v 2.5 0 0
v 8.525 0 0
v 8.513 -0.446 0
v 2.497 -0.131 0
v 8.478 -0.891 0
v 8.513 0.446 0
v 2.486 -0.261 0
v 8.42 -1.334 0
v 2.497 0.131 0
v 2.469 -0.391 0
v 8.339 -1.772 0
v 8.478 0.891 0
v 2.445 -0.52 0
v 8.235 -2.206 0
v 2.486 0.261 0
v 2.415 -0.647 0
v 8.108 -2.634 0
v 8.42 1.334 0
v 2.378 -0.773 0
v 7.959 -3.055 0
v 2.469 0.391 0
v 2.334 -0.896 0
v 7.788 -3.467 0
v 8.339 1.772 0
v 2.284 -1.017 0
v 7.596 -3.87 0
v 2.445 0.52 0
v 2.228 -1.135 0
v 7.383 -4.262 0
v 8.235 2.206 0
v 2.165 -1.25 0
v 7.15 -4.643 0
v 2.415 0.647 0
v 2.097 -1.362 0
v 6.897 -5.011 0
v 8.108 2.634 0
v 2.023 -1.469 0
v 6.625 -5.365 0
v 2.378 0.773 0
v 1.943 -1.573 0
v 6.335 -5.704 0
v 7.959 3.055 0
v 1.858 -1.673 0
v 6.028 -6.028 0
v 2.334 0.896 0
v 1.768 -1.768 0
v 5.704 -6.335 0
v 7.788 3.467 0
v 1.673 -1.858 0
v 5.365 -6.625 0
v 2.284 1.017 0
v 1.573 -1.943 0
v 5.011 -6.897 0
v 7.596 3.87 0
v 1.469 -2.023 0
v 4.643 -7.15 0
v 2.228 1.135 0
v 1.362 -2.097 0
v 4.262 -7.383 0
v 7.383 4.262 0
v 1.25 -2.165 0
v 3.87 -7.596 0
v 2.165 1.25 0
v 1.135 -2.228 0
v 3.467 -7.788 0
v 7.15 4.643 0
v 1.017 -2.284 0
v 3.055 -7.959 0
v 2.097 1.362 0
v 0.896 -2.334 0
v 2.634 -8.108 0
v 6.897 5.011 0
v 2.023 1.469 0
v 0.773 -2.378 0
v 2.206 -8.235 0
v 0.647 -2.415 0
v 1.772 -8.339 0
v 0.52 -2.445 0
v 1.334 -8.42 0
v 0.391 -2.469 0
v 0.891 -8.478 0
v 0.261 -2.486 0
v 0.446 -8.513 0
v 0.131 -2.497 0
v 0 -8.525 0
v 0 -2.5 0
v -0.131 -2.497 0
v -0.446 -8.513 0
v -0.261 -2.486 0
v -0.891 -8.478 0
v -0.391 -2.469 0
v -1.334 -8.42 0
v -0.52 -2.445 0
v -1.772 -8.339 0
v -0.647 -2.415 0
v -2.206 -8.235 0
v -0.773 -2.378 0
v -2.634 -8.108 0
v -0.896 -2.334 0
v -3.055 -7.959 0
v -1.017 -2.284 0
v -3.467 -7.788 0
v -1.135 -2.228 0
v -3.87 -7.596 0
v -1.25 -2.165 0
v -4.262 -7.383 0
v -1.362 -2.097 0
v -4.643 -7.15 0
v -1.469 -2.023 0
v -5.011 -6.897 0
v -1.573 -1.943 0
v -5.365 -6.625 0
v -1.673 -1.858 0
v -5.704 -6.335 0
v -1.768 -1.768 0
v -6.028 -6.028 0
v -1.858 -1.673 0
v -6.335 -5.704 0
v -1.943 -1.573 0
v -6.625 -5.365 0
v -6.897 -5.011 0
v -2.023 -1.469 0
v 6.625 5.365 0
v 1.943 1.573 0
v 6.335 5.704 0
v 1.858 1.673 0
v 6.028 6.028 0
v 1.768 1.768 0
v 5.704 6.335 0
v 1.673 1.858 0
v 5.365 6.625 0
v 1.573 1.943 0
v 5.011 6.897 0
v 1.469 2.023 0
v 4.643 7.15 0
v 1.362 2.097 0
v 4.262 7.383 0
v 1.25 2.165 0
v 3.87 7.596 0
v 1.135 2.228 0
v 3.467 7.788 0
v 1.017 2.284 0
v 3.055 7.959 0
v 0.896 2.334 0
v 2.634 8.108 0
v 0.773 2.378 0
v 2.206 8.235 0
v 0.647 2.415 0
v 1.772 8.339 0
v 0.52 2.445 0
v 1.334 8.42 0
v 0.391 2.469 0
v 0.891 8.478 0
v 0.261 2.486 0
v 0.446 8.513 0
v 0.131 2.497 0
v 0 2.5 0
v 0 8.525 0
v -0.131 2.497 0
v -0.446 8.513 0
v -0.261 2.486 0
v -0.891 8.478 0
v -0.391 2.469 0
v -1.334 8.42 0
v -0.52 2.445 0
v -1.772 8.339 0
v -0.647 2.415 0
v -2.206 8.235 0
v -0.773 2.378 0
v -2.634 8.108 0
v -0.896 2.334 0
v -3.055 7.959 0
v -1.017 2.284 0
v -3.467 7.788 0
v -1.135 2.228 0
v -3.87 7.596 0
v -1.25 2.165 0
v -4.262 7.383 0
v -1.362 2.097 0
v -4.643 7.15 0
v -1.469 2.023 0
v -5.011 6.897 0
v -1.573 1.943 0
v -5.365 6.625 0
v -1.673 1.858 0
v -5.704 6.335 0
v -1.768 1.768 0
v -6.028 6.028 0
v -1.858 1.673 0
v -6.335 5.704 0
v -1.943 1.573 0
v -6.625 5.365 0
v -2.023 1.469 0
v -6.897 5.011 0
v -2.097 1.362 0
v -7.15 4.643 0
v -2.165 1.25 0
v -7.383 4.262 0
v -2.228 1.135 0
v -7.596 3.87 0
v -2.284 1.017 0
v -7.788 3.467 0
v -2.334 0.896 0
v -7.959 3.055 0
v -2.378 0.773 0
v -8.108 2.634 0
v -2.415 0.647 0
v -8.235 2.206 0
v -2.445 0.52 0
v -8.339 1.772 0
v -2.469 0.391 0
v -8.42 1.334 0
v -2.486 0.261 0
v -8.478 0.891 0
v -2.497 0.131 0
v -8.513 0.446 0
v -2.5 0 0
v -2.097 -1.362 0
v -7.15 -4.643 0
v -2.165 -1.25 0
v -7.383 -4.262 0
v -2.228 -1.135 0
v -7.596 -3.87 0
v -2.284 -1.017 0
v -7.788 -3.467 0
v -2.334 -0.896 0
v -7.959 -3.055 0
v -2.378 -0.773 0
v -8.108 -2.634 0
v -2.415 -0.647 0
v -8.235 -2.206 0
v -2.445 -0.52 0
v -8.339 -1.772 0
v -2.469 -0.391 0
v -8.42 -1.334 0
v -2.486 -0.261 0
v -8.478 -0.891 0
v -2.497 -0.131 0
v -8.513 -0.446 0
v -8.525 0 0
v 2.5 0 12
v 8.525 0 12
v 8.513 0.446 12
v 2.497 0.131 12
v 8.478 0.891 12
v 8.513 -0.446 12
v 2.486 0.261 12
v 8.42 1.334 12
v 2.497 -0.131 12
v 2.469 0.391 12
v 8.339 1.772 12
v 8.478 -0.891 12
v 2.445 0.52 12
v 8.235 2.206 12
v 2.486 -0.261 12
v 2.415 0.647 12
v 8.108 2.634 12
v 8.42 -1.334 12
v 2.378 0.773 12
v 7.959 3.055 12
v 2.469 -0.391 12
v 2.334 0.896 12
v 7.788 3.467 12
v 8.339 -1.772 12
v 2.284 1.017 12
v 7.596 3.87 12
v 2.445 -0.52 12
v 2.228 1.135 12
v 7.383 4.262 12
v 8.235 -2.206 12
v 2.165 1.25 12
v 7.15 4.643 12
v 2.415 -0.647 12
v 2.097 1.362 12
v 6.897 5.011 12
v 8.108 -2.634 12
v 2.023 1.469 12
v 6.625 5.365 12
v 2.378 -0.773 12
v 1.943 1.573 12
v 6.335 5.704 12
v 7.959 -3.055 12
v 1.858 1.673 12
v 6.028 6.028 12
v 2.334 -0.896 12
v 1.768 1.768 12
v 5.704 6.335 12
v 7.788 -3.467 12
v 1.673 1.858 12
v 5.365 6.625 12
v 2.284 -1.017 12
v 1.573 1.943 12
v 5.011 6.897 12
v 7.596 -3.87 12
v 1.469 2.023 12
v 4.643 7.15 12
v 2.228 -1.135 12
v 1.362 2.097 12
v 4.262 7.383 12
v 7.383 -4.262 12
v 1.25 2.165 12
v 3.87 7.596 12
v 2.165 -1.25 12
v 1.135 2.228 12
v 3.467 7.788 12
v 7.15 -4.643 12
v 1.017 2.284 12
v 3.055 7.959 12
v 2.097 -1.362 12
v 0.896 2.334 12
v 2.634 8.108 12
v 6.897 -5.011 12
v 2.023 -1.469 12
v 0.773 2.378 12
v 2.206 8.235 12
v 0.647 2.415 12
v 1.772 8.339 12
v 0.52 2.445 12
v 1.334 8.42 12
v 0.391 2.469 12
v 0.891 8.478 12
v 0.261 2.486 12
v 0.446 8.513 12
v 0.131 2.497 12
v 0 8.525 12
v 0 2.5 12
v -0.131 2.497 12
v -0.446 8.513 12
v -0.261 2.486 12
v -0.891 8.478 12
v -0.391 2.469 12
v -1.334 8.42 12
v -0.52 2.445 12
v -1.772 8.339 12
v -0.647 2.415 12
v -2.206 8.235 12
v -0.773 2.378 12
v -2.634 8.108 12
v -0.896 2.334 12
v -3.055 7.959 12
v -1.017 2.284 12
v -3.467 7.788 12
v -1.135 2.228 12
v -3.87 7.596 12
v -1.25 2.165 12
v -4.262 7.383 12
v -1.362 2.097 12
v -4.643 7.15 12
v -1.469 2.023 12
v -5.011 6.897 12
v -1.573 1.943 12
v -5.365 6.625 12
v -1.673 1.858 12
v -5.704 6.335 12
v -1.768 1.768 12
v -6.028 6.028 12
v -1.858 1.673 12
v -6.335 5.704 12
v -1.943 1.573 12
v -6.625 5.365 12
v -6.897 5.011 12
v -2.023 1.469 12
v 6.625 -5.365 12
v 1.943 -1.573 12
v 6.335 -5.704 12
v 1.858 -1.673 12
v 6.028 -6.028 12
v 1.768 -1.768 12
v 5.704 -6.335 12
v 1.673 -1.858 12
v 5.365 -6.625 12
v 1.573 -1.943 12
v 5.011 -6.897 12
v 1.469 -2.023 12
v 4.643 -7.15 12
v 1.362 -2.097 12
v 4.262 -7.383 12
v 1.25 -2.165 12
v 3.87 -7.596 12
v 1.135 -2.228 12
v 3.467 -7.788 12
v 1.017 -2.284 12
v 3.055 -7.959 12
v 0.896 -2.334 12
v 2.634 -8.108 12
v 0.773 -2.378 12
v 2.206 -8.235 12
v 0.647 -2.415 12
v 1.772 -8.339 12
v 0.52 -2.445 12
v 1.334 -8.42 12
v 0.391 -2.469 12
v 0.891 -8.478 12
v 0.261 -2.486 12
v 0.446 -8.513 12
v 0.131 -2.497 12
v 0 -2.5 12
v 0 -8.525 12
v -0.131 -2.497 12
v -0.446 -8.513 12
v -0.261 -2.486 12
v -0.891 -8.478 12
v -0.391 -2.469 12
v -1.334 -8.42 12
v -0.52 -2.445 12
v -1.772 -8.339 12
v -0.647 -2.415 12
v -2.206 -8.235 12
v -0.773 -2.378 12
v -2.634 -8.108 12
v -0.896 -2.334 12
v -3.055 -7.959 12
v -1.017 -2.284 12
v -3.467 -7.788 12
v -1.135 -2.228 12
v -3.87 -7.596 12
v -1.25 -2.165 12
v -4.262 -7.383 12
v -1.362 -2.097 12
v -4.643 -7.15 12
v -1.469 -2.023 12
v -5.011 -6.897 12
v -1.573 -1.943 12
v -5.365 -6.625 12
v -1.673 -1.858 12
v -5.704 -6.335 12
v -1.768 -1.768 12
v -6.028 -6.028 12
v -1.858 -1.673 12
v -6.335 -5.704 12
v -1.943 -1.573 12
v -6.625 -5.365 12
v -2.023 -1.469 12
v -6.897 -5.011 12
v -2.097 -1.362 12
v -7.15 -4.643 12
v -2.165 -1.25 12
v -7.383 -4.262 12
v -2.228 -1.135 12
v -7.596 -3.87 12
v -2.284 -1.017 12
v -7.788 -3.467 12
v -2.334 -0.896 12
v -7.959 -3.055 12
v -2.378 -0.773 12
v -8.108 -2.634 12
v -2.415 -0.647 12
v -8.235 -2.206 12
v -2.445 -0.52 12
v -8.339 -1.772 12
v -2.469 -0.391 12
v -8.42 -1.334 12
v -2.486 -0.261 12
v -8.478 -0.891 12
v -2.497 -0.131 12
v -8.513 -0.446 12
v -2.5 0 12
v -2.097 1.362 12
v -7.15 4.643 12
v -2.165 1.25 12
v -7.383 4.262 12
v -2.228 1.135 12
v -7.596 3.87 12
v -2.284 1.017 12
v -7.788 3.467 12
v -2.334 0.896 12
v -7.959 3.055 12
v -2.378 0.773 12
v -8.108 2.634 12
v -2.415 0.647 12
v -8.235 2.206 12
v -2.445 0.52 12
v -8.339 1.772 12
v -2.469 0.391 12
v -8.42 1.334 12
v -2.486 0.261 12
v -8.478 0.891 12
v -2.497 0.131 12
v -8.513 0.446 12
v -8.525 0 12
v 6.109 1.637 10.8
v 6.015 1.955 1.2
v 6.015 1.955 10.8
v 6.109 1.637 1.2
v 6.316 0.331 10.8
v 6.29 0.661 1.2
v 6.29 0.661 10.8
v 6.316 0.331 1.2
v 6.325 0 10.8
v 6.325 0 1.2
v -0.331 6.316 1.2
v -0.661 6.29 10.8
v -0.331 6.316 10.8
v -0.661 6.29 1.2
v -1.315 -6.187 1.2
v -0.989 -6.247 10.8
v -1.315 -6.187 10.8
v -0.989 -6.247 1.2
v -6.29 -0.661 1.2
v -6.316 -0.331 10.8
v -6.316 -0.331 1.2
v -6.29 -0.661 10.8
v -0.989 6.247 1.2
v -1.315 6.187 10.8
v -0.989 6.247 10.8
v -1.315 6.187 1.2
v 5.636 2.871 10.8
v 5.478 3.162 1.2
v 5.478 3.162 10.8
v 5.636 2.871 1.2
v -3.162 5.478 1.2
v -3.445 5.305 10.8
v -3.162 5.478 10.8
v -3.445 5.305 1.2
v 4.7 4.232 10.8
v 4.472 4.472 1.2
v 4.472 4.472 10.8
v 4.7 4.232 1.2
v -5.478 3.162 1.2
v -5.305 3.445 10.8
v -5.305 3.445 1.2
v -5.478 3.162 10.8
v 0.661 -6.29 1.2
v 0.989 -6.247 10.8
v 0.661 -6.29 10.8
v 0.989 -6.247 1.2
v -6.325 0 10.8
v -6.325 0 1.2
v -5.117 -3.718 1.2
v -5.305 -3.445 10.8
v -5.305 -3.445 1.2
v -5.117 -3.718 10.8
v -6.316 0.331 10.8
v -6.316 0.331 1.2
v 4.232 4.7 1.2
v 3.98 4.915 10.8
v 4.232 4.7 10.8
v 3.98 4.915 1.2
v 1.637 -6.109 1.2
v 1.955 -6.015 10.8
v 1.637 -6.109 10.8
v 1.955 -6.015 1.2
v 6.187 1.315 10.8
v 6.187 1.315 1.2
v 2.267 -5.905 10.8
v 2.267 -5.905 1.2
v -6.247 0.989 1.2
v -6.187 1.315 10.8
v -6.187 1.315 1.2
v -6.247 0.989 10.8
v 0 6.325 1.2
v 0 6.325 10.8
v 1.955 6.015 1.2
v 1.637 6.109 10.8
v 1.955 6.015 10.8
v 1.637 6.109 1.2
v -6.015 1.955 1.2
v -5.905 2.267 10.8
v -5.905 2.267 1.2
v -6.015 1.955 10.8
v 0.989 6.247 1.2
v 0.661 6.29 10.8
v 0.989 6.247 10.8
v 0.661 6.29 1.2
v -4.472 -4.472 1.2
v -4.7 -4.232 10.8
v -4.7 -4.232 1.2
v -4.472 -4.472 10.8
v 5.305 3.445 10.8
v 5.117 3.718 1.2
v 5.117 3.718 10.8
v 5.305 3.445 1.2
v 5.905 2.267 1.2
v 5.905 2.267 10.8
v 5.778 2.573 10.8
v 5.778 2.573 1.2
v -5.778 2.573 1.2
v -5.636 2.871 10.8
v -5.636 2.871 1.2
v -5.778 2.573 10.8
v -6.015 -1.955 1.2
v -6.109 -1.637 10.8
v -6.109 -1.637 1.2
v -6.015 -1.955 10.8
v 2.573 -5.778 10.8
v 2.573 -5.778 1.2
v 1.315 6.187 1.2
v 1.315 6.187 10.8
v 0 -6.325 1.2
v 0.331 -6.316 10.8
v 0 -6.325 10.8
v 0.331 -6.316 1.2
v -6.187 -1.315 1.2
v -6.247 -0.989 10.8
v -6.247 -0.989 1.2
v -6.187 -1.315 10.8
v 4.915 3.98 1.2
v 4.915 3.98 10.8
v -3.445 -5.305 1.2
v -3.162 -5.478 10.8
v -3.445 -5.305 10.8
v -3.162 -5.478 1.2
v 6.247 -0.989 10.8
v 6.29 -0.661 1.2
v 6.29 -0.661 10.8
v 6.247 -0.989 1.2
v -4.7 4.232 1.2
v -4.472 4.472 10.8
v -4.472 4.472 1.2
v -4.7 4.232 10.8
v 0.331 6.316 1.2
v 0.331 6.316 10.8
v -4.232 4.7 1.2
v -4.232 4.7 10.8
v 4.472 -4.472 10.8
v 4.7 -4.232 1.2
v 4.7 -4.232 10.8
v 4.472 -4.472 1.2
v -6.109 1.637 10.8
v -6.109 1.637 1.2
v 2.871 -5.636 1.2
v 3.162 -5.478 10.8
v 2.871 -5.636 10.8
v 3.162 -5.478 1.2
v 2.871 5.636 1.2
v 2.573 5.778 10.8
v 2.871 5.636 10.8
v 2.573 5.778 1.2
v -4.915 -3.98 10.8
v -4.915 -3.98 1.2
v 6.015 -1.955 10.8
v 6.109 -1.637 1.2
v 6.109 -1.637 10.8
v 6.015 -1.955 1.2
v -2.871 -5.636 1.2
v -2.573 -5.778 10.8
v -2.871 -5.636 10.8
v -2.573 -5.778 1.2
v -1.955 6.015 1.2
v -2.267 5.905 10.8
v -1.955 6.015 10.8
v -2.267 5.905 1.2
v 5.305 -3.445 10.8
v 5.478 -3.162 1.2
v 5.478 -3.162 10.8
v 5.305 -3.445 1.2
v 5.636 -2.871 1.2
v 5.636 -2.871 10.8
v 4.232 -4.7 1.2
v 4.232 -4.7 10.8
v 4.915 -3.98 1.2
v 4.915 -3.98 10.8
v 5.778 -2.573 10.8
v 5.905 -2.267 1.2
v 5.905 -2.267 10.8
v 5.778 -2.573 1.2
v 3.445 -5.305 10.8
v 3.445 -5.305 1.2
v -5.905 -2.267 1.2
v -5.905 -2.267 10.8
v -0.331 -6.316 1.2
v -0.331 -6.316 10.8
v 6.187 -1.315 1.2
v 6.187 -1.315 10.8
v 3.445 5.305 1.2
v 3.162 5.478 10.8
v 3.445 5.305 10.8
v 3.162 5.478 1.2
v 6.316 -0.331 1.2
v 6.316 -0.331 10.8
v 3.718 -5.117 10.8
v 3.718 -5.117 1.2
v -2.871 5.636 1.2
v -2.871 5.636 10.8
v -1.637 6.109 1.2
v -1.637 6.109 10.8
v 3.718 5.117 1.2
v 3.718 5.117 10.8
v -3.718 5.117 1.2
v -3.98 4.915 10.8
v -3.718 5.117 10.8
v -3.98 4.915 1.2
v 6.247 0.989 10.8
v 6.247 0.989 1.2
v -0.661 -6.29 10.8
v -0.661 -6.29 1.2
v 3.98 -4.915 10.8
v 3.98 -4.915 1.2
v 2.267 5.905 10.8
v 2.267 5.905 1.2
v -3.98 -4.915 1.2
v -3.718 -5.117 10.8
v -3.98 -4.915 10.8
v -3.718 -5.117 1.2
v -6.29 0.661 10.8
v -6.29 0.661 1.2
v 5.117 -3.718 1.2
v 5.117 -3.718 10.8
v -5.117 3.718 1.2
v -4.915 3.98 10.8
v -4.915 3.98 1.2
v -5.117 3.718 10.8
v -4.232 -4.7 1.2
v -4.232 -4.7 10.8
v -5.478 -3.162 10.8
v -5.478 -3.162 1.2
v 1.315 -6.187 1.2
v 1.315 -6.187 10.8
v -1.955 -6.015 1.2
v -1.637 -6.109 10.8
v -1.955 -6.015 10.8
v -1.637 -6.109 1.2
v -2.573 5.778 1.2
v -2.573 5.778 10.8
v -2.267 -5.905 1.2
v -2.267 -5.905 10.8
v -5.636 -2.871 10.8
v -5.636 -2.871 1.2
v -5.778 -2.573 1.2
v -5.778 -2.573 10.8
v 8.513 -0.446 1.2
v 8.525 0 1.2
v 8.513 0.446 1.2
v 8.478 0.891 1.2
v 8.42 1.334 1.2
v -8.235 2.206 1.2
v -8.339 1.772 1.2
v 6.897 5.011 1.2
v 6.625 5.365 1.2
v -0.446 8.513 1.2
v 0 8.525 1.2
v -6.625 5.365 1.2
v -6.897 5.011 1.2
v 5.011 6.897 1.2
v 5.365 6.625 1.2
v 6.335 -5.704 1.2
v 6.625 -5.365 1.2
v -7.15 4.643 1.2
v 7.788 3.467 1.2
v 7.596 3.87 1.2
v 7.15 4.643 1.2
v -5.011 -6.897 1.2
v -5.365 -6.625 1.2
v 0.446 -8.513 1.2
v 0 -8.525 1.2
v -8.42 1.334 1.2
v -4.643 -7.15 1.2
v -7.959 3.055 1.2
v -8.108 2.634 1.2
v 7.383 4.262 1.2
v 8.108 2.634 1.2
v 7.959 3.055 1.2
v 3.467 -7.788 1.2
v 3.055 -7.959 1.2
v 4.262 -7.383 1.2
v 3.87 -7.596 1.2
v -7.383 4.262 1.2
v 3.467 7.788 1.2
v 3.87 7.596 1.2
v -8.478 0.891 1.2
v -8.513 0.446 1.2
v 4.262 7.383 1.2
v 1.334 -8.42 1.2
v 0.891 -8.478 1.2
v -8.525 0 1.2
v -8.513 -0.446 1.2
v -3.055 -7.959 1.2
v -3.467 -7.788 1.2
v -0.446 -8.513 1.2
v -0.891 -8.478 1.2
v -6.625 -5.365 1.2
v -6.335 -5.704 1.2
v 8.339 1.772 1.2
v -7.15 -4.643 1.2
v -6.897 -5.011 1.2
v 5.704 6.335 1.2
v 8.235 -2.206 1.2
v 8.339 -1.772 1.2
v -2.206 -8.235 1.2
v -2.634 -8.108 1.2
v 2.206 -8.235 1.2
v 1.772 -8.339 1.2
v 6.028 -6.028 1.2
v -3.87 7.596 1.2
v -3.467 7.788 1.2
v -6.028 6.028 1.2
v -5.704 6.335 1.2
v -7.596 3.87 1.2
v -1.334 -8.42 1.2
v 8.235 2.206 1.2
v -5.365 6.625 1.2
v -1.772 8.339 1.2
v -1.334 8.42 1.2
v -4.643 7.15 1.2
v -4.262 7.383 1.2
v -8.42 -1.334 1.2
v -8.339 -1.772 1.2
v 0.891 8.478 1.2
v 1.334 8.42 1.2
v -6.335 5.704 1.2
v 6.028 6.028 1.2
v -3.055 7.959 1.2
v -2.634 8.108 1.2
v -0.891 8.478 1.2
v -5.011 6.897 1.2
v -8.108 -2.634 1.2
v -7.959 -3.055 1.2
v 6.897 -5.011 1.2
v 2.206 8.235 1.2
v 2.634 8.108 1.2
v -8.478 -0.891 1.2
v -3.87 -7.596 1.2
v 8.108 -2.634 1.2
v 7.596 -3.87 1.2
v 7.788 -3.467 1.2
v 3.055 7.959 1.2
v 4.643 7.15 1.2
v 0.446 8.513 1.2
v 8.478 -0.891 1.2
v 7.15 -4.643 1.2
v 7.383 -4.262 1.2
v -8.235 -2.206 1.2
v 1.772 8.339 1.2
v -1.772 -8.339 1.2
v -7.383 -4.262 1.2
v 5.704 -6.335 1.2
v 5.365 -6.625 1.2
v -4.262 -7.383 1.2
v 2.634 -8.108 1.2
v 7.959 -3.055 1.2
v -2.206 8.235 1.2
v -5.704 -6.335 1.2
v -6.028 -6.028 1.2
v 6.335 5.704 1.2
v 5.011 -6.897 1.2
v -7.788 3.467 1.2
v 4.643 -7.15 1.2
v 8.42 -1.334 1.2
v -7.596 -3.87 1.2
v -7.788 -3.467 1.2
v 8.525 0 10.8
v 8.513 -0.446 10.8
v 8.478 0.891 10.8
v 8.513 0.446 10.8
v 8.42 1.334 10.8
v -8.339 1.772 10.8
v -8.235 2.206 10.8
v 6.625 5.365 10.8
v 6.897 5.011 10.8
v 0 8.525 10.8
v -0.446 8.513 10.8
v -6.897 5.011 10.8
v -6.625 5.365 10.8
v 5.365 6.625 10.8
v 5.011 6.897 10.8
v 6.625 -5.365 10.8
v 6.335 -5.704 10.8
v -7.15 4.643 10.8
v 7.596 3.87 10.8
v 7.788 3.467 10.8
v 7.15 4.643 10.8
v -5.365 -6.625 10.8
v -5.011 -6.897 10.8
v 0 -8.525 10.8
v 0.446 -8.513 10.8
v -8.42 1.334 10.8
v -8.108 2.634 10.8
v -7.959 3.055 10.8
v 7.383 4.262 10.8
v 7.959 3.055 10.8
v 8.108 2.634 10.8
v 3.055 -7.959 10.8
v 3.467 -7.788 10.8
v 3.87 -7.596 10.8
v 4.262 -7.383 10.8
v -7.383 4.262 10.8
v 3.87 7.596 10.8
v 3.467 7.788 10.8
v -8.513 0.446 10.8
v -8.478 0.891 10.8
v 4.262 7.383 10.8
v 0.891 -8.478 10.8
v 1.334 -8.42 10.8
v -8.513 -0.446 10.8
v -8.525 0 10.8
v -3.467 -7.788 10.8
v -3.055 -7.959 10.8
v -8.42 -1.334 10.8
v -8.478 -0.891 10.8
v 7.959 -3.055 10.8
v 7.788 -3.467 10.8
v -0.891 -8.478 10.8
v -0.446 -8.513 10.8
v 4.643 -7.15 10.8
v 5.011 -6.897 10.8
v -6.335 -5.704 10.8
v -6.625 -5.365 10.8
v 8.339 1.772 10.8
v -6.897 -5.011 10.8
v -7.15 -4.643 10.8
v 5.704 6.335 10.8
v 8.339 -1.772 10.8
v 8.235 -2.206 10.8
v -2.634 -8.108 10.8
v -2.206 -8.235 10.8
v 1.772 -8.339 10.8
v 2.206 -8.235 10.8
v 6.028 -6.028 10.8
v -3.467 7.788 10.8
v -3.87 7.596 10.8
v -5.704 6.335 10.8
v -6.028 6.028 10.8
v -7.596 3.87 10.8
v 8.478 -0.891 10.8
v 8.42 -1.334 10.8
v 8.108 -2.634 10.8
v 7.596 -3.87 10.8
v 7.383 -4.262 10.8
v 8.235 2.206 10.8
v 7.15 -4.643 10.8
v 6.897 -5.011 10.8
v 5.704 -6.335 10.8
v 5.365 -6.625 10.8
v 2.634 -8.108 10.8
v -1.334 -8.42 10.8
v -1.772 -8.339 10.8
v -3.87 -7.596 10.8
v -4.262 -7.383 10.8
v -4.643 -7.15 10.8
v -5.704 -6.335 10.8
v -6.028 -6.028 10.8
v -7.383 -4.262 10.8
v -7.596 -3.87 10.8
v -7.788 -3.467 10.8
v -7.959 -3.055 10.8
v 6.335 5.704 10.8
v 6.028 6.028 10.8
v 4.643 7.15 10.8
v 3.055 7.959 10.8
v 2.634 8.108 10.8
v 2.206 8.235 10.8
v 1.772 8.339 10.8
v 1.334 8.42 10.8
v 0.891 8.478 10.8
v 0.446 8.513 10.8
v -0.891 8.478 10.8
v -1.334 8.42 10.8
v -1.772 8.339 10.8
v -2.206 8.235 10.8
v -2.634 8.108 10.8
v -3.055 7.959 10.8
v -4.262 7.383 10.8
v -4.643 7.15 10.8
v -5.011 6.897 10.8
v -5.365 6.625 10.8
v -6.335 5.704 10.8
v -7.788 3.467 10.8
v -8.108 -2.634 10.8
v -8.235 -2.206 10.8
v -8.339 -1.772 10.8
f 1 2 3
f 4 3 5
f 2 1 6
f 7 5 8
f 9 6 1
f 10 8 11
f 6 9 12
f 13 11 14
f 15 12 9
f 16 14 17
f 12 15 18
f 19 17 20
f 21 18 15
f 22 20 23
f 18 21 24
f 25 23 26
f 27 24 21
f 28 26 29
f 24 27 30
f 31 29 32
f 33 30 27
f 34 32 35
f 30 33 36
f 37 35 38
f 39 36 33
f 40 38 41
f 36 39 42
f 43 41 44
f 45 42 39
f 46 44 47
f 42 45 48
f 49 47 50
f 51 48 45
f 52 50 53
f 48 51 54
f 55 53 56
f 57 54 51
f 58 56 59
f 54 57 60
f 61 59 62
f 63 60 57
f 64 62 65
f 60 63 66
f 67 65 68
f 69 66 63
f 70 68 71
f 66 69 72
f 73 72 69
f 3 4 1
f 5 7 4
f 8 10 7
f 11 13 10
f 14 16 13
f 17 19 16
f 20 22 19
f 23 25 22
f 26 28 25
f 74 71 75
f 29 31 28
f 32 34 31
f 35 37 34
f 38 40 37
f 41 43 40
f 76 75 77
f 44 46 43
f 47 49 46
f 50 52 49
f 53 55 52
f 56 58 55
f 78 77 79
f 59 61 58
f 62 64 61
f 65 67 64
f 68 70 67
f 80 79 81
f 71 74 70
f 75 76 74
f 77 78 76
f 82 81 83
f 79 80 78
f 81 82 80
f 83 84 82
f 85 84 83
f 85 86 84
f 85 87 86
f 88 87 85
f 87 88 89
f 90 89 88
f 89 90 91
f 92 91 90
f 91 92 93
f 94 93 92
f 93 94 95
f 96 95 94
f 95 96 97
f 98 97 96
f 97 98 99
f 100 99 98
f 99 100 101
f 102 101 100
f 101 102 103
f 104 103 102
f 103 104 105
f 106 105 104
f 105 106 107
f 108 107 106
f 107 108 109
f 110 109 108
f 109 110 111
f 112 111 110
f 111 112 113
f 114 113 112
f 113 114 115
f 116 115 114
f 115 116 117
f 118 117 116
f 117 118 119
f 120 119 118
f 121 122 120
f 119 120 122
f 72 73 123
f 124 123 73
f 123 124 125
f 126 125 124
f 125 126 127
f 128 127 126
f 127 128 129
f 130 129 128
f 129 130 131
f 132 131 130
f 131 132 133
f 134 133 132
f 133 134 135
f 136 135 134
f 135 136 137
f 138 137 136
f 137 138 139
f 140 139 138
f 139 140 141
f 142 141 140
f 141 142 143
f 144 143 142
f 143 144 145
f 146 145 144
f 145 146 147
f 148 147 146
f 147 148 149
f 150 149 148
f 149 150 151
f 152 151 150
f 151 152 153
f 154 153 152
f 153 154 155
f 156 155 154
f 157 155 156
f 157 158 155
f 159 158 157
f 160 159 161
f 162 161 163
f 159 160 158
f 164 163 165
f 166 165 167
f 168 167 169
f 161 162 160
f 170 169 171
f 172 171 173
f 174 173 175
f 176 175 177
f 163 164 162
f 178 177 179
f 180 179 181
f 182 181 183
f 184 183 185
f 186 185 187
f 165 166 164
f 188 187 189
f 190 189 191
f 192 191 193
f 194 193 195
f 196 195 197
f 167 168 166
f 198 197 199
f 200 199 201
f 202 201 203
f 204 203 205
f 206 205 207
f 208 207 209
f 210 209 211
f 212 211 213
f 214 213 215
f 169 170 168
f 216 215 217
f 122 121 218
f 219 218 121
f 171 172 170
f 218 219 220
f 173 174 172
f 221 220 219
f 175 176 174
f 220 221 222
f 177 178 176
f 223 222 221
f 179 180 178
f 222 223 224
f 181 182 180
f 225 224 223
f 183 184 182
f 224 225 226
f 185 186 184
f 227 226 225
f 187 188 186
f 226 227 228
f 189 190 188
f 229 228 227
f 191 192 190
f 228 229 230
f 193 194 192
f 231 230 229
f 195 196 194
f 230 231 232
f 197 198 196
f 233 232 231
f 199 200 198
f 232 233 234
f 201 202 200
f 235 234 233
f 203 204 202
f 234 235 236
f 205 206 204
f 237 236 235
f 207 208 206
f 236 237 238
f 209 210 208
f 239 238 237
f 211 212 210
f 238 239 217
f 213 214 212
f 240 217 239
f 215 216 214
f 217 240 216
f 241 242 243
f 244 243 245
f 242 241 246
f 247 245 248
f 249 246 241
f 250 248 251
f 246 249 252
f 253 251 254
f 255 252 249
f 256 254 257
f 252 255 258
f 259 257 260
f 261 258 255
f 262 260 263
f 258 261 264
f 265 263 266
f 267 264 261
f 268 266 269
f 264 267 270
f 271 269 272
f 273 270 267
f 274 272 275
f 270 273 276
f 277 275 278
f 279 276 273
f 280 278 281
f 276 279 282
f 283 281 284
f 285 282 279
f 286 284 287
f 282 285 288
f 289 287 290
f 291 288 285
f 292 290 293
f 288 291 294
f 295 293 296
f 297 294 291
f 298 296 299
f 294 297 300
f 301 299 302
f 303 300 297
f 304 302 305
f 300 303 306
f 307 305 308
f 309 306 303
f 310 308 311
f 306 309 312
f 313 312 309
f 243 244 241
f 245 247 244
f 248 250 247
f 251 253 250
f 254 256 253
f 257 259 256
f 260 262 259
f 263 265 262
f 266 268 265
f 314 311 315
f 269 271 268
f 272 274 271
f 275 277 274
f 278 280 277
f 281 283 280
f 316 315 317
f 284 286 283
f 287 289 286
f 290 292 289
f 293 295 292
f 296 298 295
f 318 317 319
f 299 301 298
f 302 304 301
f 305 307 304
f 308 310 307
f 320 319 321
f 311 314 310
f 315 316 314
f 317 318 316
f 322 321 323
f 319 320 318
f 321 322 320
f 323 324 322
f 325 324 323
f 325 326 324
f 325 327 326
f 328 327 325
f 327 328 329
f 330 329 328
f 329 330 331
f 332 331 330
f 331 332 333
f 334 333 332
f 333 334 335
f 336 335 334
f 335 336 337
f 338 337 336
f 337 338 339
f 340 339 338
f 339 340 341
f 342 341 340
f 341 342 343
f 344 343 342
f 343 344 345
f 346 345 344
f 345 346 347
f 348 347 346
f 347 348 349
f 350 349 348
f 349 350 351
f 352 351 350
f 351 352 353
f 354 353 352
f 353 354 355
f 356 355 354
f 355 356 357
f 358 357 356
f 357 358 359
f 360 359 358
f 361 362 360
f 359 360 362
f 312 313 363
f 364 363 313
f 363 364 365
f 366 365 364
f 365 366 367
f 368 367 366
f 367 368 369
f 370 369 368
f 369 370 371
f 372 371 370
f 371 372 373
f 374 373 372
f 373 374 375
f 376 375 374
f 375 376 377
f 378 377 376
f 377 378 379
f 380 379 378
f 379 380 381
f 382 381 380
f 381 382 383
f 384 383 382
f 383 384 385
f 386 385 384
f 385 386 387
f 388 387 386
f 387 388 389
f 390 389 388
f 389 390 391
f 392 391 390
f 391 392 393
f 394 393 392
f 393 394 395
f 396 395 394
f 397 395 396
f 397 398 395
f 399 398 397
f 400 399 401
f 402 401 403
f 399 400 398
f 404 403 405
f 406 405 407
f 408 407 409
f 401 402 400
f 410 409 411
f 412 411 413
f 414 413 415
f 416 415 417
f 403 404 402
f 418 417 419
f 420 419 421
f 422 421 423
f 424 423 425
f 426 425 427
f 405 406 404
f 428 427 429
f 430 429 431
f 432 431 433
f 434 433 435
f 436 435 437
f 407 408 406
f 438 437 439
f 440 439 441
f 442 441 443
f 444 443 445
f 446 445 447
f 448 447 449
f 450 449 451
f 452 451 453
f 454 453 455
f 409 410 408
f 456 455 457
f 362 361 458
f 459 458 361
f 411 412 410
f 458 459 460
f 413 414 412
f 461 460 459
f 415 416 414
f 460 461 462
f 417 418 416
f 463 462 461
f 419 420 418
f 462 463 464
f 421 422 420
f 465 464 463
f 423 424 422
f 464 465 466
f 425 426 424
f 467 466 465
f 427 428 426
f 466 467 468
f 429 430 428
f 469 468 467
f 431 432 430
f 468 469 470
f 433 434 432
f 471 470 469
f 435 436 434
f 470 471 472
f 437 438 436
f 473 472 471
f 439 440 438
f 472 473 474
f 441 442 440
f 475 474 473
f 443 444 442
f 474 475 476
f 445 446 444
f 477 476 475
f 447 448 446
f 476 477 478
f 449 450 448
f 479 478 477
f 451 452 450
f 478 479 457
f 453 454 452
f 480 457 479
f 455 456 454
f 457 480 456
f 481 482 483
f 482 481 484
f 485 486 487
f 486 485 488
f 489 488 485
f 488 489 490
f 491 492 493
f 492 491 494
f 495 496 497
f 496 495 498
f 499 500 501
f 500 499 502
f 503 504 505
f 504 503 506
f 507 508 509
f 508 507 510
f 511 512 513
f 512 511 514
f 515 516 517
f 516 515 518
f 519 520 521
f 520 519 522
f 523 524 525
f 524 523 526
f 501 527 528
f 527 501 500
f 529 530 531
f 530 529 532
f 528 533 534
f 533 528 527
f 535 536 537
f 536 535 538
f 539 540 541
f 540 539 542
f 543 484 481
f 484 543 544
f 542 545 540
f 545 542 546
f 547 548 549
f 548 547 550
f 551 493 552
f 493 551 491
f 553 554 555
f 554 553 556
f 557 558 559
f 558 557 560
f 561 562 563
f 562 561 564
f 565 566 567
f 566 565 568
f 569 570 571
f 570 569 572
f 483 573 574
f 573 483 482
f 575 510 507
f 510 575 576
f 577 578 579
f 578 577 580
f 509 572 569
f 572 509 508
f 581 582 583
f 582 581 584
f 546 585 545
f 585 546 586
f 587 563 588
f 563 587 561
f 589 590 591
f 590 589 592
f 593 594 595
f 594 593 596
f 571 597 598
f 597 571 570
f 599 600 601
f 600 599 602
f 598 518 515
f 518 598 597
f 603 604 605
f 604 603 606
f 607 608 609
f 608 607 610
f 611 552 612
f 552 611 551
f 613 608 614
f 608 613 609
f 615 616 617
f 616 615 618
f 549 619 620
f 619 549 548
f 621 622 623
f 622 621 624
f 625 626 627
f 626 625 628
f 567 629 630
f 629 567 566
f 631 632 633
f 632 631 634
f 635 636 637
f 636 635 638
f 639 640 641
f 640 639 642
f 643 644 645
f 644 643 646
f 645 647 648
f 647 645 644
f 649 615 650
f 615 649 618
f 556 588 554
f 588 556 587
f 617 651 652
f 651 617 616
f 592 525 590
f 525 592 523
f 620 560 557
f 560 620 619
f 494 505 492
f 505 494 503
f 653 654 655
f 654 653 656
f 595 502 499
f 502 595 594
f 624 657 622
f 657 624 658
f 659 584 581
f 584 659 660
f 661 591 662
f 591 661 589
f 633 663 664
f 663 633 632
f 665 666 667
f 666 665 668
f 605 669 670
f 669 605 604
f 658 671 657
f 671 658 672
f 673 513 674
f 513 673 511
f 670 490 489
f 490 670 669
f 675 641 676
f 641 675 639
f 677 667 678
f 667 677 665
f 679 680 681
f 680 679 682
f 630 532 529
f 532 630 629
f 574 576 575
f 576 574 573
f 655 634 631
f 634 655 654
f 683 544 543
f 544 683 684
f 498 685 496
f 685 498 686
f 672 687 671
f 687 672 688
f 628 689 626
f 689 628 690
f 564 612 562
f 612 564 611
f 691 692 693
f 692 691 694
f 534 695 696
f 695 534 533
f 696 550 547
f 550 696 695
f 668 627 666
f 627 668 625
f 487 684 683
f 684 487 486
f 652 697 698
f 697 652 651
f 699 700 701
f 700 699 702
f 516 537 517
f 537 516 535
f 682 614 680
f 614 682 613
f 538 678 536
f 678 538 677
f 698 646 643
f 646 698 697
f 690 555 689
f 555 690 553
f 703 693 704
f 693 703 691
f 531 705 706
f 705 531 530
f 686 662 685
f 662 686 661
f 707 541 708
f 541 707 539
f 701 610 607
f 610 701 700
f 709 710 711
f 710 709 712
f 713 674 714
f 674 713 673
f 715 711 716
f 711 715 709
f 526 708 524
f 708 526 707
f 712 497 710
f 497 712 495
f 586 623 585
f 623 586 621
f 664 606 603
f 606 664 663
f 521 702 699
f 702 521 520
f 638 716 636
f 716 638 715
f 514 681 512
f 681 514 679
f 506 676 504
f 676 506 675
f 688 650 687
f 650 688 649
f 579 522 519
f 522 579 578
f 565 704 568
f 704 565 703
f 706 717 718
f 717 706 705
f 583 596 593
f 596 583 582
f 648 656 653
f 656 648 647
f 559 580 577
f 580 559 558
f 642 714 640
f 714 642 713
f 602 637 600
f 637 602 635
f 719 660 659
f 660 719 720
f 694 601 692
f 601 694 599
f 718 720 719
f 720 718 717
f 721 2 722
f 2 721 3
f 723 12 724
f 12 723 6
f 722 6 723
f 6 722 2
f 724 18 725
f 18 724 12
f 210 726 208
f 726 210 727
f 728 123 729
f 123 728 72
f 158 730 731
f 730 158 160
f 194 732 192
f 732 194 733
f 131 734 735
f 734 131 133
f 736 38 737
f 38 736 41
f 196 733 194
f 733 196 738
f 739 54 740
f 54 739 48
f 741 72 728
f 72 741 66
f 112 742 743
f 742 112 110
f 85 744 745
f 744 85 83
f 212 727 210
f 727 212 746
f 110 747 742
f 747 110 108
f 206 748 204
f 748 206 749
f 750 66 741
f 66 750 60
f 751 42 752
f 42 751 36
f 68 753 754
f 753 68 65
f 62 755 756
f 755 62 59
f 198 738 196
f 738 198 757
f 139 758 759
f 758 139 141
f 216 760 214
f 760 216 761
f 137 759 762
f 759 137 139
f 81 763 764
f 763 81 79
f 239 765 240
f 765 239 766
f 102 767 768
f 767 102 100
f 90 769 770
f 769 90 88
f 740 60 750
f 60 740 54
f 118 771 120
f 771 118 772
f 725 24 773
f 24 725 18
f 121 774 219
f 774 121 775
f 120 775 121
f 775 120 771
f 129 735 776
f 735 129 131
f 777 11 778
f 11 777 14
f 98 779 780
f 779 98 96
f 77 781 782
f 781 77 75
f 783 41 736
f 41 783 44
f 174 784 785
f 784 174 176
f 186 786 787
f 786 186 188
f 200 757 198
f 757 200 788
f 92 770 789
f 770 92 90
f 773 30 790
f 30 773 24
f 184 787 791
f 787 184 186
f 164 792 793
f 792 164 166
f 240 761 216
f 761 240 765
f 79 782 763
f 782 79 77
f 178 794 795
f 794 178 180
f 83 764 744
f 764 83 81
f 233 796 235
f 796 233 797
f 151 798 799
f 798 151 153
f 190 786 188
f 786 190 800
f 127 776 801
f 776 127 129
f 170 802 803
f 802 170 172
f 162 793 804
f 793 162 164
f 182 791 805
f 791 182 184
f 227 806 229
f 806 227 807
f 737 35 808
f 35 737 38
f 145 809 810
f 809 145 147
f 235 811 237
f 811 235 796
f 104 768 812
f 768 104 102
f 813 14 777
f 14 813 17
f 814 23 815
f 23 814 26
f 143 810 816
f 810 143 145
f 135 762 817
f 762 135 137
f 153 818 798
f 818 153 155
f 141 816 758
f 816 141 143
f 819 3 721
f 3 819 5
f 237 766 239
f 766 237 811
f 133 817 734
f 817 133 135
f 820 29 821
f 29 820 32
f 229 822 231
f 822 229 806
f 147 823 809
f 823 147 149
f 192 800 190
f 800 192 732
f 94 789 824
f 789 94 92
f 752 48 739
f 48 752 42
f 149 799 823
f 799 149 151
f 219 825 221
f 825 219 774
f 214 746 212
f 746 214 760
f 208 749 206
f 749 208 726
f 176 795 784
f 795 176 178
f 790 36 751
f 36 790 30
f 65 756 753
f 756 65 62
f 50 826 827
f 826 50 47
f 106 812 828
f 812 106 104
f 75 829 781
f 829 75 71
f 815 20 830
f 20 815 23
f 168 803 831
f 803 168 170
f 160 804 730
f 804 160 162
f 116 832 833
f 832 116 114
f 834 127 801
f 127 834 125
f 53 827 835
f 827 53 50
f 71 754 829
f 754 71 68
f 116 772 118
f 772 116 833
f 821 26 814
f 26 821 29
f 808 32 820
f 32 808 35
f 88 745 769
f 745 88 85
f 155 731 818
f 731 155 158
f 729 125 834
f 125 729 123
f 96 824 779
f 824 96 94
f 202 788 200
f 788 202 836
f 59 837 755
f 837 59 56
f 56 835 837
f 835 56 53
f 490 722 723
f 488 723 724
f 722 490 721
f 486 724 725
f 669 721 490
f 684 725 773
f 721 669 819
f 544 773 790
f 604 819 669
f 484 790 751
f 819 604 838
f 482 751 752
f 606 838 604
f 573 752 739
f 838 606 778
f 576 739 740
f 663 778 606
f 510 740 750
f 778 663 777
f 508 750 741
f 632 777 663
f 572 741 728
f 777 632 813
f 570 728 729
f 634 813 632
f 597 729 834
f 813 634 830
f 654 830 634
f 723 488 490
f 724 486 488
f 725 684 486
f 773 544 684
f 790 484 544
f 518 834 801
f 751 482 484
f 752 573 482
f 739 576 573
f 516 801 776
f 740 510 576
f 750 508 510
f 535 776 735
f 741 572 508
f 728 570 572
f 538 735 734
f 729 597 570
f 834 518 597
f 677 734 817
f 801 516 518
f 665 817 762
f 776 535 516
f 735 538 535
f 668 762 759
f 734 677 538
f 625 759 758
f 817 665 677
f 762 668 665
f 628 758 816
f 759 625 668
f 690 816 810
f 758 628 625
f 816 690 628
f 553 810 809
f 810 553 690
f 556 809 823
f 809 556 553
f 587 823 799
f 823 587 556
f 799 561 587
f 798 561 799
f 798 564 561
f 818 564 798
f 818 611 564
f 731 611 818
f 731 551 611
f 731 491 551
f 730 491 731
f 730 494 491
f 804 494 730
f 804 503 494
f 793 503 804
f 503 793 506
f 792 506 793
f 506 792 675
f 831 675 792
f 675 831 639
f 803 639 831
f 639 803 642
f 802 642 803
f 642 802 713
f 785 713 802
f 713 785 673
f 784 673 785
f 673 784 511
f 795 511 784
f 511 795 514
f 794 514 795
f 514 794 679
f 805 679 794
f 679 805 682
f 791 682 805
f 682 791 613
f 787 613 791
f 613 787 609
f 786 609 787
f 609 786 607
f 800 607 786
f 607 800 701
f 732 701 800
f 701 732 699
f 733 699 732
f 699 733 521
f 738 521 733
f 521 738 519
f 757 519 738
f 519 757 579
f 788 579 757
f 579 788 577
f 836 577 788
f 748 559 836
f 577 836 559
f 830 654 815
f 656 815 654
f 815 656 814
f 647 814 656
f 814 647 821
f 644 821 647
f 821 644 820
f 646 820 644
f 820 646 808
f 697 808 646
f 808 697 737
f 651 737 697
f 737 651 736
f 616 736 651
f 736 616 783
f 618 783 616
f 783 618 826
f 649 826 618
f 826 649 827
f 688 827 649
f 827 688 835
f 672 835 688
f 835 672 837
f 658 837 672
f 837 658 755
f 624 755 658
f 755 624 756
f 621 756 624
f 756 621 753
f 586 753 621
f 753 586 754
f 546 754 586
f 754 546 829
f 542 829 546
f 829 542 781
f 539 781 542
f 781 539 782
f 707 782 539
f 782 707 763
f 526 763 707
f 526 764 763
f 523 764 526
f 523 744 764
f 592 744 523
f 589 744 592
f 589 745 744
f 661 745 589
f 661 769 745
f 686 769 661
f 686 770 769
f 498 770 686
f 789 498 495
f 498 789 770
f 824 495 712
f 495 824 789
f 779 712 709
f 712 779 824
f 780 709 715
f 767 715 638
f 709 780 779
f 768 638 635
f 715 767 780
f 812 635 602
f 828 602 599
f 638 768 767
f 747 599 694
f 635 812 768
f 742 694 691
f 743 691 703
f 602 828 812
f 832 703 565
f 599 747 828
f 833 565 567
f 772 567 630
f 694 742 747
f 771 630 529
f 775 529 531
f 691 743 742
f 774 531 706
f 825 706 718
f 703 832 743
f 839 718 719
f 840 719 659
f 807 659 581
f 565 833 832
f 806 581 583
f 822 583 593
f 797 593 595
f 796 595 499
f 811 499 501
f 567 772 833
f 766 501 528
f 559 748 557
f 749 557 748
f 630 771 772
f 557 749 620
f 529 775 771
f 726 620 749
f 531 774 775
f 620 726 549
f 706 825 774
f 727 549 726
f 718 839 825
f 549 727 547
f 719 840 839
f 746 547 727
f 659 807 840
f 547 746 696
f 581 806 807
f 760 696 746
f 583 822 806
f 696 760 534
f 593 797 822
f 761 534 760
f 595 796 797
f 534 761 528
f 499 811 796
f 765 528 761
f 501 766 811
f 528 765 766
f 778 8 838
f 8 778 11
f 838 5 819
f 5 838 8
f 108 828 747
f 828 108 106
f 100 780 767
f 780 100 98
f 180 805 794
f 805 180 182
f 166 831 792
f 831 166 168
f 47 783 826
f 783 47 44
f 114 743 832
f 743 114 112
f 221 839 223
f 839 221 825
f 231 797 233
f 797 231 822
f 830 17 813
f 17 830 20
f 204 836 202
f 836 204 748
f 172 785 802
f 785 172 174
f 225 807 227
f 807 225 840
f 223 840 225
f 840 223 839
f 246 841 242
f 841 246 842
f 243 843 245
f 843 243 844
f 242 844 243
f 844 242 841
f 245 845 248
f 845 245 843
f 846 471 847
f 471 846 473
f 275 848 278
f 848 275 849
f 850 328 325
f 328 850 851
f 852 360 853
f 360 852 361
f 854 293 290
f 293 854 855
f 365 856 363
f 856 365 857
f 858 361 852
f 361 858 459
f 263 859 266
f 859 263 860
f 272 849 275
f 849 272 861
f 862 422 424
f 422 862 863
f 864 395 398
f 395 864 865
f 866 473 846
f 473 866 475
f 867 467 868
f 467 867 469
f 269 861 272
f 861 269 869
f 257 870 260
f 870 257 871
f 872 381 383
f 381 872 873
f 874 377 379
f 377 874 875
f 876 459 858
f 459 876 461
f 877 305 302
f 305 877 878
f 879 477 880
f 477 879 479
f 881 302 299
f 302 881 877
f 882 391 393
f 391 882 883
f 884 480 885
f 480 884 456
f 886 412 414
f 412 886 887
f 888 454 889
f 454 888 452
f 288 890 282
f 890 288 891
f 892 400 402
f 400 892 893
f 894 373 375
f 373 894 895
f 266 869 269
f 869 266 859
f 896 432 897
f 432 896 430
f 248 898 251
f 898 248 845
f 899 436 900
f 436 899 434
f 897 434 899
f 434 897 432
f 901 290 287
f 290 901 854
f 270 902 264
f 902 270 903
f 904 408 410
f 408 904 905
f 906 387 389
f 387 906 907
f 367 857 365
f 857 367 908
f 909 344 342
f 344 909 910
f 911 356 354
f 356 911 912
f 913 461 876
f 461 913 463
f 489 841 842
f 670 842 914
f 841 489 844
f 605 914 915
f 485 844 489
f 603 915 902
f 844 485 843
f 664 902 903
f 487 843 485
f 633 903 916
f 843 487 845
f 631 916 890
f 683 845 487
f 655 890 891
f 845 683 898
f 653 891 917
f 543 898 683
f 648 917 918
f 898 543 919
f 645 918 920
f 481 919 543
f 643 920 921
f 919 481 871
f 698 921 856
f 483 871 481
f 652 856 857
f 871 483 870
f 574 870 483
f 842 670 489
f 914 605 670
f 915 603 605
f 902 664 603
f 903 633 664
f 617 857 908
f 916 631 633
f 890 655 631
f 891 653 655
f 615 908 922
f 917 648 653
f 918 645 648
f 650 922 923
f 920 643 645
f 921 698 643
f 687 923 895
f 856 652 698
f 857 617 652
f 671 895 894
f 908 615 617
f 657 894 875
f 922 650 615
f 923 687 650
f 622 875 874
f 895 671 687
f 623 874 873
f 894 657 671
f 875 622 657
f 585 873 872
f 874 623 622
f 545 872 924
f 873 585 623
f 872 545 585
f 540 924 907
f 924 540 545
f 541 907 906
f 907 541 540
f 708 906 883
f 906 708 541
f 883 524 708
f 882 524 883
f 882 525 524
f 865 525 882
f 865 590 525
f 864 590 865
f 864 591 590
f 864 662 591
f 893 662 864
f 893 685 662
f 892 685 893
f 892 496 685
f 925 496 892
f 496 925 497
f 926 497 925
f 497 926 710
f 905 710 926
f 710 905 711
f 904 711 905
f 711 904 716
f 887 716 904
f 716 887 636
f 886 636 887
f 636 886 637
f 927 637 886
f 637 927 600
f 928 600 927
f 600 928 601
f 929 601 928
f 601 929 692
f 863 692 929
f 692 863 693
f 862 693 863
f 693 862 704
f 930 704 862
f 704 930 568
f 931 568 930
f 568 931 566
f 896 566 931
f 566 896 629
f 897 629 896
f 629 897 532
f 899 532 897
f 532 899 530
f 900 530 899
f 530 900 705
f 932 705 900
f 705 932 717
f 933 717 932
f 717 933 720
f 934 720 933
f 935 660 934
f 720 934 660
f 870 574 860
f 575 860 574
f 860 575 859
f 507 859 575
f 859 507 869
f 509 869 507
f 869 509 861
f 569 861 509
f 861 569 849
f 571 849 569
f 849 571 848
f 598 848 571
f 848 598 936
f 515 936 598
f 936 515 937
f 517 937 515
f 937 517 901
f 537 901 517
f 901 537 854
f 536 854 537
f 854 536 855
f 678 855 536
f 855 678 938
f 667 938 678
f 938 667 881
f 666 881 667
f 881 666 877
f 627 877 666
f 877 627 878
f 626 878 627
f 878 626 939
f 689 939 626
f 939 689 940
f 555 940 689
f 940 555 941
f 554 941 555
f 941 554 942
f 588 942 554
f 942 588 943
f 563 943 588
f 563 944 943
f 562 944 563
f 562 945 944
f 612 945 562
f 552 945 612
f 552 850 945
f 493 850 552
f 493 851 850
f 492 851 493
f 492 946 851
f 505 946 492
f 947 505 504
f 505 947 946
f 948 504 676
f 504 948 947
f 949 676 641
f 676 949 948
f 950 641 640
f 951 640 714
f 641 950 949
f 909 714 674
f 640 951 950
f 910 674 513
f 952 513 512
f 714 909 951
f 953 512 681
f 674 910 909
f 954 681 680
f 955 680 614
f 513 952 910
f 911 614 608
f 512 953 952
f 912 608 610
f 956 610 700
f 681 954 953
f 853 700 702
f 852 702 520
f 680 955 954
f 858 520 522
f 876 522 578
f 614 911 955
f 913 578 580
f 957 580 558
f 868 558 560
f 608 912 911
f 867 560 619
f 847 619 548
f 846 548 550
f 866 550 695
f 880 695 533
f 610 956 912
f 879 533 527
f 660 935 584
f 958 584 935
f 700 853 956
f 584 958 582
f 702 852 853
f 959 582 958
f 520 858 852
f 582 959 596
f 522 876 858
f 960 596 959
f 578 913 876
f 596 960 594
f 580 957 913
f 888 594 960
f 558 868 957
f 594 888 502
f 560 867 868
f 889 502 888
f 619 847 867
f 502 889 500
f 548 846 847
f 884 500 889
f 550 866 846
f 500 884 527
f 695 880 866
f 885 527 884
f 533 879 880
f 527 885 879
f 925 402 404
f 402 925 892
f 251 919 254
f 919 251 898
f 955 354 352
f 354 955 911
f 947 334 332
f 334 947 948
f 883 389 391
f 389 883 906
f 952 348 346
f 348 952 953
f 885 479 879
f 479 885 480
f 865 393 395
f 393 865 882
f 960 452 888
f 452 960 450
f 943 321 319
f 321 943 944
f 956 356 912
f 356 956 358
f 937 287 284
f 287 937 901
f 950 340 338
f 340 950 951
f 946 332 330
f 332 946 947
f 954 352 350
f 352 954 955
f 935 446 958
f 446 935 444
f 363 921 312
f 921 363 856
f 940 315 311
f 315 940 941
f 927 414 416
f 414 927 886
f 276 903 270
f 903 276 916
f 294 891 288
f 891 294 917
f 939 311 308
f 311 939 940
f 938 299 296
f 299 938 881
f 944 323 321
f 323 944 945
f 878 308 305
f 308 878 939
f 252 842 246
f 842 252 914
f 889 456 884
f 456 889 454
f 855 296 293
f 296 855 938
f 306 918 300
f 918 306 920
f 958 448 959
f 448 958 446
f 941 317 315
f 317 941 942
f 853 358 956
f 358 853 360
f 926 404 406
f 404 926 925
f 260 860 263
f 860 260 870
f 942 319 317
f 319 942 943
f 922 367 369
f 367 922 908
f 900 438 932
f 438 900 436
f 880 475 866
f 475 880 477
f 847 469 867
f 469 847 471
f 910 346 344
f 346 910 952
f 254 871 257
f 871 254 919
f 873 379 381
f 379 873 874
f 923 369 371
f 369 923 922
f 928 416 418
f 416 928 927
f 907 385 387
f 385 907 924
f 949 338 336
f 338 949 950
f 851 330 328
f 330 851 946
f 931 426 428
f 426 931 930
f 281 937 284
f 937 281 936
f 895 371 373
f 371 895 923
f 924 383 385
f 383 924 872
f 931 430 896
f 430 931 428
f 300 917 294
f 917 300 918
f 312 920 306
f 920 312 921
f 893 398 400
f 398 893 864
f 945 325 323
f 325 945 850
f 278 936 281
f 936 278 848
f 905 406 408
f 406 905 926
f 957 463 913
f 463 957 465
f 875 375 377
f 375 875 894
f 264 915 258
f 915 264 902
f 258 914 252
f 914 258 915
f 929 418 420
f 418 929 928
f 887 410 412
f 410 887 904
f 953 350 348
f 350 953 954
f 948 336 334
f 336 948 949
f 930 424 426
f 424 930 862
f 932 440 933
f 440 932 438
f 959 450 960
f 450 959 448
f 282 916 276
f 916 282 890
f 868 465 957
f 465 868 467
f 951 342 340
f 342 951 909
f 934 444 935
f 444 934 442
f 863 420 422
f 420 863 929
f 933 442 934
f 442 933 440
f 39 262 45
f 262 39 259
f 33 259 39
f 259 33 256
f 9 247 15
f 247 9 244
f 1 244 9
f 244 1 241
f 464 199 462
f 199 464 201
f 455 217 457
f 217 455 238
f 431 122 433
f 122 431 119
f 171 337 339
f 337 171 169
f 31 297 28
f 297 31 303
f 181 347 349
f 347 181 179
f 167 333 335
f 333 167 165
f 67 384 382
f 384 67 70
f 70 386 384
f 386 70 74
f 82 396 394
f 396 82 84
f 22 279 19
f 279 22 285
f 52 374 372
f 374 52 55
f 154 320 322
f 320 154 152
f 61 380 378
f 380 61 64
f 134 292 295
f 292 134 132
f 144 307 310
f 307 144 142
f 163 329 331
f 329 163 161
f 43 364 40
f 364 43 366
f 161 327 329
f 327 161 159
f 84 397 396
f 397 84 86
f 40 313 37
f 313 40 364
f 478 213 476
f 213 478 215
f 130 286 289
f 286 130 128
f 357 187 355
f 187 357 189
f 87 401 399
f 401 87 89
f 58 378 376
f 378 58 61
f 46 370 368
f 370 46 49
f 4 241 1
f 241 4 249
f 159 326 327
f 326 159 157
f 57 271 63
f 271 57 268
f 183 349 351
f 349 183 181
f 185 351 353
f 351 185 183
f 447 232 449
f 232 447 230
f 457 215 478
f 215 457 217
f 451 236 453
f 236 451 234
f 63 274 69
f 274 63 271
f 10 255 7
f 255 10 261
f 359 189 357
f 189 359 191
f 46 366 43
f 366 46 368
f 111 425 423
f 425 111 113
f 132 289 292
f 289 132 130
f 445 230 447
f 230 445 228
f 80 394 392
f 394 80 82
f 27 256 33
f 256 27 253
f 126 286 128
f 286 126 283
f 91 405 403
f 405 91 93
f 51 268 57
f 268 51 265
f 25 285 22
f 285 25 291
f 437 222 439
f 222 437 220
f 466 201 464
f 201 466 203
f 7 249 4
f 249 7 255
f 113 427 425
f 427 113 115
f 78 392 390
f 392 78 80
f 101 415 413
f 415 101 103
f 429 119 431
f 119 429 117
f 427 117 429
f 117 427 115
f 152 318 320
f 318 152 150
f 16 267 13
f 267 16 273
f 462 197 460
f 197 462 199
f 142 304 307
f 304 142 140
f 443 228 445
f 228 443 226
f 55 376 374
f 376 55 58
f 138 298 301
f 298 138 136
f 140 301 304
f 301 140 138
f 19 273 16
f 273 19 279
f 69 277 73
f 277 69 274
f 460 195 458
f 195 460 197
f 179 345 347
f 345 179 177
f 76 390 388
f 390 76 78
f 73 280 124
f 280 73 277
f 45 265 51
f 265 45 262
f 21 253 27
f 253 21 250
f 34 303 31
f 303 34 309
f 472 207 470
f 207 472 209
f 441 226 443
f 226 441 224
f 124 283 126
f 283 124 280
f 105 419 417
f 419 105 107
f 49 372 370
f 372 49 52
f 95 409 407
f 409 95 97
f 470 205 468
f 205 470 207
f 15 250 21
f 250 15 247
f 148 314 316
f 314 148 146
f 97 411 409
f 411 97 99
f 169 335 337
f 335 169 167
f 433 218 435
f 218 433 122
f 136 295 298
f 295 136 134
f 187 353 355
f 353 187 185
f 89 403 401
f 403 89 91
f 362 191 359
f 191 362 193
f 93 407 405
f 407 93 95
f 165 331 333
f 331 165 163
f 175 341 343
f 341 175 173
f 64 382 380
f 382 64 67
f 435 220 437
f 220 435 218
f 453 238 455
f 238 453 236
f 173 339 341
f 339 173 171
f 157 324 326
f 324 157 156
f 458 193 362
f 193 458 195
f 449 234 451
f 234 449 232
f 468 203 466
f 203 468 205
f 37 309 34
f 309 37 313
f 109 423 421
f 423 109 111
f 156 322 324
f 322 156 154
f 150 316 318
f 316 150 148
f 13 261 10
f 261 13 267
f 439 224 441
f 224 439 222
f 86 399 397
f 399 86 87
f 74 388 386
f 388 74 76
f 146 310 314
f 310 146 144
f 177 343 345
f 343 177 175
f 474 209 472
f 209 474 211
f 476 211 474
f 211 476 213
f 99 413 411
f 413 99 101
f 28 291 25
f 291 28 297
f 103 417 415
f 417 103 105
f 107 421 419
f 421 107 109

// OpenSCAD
$fn = 120;

// Timing pulley parameters
teeth = 16;
pitch_diameter = 9.65;          // mm
pitch_radius = pitch_diameter/2;

pulley_height = 12;             // mm
bore_diameter = 5;              // mm

// Tooth geometry (approximation)
tooth_height = 1.2;             // mm radial add above pitch radius
tooth_tip_width = 1.2;          // mm tangential width at tip
tooth_root_width = 2.2;         // mm tangential width at root
tooth_root_relief = 0.4;        // mm radial relief below pitch radius

// Body geometry
hub_extra_radius = 1.5;         // mm extra beyond pitch radius for core
flange_thickness = 1.2;         // mm
flange_extra_radius = 2.5;      // mm extra beyond tooth tip radius

tooth_tip_radius = pitch_radius + tooth_height;
core_radius = pitch_radius + hub_extra_radius;
flange_radius = tooth_tip_radius + flange_extra_radius;

pitch_circumference = PI * pitch_diameter;
tooth_pitch = pitch_circumference / teeth;
tooth_angle = 360 / teeth;

module tooth2d() {
    // A simple trapezoid tooth profile centered on +X axis
    // Root is slightly below pitch radius to create a valley
    r0 = pitch_radius - tooth_root_relief;
    r1 = tooth_tip_radius;

    // Convert tangential widths to angular offsets at each radius
    a0 = (tooth_root_width / r0) * 180 / PI;
    a1 = (tooth_tip_width  / r1) * 180 / PI;

    polygon(points=[
        [r0*cos(-a0/2), r0*sin(-a0/2)],
        [r1*cos(-a1/2), r1*sin(-a1/2)],
        [r1*cos( a1/2), r1*sin( a1/2)],
        [r0*cos( a0/2), r0*sin( a0/2)]
    ]);
}

module pulley() {
    difference() {
        union() {
            // Core cylinder
            cylinder(h=pulley_height, r=core_radius);

            // Teeth
            for (i = [0:teeth-1]) {
                rotate([0,0,i*tooth_angle])
                    linear_extrude(height=pulley_height)
                        tooth2d();
            }

            // Flanges (top and bottom)
            cylinder(h=flange_thickness, r=flange_radius);
            translate([0,0,pulley_height - flange_thickness])
                cylinder(h=flange_thickness, r=flange_radius);
        }

        // Bore
        translate([0,0,-0.5])
            cylinder(h=pulley_height+1, r=bore_diameter/2);
    }
}

pulley();
